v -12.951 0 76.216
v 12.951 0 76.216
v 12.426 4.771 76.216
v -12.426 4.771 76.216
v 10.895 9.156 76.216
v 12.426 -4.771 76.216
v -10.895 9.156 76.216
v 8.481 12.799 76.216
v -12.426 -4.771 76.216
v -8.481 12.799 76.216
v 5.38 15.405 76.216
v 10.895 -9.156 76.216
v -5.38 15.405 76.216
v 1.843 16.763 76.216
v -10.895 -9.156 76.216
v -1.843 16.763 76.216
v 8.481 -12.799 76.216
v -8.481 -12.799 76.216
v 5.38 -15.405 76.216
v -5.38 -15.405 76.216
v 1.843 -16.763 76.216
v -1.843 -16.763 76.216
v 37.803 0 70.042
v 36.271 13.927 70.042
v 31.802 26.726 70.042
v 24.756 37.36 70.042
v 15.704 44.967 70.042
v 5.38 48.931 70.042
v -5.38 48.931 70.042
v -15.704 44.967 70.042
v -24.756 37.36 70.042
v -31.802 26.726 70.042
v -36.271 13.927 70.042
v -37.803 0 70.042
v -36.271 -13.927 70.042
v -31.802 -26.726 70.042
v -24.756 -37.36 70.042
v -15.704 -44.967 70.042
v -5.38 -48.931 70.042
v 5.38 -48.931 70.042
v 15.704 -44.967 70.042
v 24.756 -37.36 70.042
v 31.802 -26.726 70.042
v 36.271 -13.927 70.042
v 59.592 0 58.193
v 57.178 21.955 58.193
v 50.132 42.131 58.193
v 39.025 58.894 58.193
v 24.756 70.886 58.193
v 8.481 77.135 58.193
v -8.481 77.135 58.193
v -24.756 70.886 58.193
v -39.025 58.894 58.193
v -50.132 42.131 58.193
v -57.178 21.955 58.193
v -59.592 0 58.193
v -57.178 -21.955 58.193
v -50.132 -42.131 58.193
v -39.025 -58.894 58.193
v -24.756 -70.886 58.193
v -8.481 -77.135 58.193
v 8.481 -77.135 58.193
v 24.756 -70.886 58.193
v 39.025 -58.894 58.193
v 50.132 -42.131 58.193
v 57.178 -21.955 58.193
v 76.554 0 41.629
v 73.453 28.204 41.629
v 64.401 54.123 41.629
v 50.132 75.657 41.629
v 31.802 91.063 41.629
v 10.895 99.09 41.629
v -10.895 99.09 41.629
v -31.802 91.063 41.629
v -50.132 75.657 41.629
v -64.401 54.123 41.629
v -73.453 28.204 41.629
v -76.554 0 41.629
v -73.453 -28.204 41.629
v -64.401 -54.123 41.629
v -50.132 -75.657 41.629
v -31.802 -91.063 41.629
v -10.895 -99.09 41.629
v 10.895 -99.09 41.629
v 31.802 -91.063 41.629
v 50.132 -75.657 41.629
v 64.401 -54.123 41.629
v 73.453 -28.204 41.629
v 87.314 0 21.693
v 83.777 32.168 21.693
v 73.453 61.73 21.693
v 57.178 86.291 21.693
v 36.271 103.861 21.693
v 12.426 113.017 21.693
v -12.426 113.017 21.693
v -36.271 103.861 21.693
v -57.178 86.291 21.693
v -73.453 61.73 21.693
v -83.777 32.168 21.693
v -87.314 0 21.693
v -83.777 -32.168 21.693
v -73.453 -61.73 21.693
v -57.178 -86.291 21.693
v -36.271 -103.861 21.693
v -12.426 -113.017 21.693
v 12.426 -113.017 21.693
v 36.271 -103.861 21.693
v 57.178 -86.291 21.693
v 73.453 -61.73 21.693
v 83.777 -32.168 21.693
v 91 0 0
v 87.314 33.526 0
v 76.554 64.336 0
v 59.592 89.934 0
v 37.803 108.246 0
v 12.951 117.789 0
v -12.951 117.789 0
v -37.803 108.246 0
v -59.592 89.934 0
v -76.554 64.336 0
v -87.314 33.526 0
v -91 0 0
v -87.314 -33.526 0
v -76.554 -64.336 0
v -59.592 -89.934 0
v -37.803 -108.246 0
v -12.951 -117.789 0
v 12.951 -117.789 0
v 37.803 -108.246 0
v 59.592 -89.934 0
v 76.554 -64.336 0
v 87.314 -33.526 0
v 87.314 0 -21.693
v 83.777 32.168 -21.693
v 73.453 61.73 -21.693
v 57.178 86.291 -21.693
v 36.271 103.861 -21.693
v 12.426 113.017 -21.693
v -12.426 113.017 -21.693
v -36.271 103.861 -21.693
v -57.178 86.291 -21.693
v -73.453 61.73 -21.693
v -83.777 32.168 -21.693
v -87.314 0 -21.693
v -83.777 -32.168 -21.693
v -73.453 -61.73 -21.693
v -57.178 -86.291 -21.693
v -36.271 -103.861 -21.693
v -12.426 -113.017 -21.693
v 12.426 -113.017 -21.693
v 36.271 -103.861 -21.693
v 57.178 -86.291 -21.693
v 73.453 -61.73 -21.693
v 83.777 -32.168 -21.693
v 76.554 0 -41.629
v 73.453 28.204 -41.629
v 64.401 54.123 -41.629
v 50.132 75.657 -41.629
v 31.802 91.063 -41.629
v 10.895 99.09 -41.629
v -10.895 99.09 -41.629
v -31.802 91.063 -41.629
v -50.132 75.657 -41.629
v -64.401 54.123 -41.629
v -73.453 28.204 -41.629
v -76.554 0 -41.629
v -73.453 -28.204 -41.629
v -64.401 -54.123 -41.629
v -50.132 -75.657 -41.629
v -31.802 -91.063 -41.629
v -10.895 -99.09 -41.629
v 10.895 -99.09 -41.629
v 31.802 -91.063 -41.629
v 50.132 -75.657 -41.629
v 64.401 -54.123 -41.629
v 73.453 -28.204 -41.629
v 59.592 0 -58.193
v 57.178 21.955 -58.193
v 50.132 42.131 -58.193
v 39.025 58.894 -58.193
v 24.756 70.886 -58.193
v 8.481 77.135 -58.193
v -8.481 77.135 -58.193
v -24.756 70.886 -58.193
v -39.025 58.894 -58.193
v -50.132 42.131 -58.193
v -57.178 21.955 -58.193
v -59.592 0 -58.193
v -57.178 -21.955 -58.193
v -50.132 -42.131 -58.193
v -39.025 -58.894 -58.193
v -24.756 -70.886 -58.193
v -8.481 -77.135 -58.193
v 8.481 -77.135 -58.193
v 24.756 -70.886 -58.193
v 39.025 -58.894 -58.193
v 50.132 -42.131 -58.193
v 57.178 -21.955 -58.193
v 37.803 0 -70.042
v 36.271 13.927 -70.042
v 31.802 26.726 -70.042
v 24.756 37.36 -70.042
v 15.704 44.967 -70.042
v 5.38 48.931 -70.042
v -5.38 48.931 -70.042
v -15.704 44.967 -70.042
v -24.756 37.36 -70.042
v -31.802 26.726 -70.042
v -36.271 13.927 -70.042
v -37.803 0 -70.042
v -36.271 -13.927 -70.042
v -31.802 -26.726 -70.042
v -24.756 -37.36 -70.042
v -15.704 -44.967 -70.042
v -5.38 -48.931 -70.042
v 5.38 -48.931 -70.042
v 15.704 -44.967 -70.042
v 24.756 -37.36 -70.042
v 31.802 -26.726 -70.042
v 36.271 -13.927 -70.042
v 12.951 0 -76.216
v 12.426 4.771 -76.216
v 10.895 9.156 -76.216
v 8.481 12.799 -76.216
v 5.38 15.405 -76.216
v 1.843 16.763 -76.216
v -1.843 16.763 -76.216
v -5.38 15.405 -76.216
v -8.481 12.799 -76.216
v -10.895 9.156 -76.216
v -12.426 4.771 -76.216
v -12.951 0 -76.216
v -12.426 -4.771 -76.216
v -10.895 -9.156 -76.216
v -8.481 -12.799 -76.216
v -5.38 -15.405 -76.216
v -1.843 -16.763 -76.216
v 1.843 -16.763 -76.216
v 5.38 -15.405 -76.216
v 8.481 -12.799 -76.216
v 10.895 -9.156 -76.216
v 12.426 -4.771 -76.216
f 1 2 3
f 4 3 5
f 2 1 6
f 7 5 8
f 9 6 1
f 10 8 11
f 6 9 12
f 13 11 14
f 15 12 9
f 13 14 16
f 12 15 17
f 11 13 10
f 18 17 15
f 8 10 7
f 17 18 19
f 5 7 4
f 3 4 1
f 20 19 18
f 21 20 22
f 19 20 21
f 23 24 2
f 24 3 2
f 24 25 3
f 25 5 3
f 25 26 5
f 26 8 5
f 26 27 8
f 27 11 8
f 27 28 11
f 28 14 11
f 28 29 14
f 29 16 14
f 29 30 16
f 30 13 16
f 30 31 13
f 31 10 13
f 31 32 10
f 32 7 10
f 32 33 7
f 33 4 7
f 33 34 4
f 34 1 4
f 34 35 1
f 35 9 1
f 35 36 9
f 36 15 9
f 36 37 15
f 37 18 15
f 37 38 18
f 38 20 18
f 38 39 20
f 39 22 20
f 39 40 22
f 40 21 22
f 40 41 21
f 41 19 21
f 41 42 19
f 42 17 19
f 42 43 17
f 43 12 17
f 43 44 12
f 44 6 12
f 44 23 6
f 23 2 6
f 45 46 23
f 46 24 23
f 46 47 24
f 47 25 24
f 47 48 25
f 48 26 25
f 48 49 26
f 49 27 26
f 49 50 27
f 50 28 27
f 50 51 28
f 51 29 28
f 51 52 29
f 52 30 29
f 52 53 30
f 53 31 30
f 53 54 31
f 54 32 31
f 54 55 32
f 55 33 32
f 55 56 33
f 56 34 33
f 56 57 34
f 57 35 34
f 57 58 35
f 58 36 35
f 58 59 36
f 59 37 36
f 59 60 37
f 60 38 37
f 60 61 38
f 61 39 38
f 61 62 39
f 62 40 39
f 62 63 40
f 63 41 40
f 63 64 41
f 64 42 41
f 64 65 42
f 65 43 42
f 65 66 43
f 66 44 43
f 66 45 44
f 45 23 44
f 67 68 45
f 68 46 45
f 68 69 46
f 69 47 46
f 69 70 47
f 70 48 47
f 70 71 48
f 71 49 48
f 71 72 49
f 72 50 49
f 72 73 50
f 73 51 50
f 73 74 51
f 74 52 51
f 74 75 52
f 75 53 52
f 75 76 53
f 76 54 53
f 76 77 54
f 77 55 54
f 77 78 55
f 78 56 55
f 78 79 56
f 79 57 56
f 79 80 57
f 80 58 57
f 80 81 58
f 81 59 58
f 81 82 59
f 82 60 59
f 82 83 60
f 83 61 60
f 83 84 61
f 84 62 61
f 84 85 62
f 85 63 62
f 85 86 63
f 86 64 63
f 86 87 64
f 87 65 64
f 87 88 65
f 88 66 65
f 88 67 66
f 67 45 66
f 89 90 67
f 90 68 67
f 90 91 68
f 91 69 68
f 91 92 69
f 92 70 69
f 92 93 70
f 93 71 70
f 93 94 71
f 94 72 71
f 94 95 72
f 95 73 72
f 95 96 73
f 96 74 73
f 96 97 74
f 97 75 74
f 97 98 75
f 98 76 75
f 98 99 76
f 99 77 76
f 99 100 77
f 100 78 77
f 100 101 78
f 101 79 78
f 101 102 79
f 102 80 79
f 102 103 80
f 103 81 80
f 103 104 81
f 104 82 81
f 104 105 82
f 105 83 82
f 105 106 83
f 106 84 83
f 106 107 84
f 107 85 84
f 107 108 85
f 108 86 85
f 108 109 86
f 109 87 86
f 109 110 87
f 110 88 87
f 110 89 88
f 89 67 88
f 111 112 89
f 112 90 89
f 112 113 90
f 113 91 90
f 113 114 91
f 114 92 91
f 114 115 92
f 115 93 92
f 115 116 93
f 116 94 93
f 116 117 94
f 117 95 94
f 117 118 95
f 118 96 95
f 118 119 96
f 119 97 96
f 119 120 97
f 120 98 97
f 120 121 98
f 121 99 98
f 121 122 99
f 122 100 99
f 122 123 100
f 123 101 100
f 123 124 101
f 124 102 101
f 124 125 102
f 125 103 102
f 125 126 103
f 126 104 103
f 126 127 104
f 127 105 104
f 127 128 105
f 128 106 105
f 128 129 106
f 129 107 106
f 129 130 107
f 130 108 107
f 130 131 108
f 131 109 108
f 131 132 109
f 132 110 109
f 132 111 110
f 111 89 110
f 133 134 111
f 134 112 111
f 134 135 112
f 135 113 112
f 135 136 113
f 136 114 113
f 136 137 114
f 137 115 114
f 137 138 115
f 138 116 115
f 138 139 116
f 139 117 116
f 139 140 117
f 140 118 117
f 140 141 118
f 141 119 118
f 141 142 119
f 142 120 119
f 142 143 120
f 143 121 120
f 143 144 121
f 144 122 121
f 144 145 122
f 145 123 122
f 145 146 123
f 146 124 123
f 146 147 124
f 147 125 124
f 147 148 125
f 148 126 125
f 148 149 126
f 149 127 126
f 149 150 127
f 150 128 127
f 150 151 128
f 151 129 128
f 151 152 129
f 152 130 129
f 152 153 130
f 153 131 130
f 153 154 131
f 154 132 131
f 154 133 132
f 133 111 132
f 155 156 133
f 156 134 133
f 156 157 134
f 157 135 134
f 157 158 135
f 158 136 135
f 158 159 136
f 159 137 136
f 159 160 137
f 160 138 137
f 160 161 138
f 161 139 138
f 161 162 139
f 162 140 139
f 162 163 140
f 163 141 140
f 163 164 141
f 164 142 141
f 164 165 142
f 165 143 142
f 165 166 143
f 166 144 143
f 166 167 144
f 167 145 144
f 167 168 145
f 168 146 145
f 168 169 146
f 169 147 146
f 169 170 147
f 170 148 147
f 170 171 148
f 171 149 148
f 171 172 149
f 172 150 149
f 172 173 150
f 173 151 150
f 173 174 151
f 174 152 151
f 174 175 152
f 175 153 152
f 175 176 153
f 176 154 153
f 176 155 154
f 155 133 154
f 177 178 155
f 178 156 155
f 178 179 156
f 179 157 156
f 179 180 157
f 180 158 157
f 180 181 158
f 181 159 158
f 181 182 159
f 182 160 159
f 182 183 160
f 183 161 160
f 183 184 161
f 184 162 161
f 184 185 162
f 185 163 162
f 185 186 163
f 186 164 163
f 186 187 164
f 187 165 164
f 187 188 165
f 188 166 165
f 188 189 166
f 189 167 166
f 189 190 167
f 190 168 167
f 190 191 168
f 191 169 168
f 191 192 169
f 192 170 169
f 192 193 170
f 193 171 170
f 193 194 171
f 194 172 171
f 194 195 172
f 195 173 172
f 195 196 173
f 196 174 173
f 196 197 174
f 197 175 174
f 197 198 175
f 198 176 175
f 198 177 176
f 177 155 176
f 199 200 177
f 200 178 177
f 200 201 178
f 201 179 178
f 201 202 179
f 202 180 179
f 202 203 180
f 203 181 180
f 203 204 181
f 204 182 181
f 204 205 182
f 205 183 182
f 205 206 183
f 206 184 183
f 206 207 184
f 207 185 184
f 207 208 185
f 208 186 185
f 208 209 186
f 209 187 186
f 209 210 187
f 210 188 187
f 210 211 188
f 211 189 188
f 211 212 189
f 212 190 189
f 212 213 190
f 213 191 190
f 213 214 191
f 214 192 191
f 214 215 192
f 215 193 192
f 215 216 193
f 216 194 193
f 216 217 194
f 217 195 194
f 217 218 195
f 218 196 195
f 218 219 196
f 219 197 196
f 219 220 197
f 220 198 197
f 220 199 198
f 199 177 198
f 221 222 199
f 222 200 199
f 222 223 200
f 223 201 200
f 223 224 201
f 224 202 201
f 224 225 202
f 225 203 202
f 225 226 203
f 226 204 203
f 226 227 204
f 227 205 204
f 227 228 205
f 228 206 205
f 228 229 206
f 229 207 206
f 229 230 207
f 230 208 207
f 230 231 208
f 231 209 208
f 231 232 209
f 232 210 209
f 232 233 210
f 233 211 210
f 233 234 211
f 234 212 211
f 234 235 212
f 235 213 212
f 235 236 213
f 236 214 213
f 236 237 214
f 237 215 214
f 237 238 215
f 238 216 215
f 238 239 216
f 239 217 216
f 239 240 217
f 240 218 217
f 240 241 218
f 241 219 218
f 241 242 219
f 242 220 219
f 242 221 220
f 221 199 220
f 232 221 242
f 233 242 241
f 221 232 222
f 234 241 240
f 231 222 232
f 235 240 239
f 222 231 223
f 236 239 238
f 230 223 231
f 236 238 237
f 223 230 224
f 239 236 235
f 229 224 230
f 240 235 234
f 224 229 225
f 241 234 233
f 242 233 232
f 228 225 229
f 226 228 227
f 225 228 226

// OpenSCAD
// Generated by SolidPython 1.0.1 on 2020-07-29 00:46:51


scale(v = [13, 17, 11]) {
	sphere(r = 7);
}
/***********************************************
*********      SolidPython code:      **********
************************************************
 
# import packages: SolidPython
from solid import *
from solid.utils import *
from itertools import chain, combinations, permutations


class Resize:

    def __init__(self, scad_file):
        self.scad_file = scad_file
        #self.scad_file = import_scad(scad_file)
        # cone/cylinder param:
        self.r1 = 0
        self.r2 = 0
        self.h = 0
        # rectangular prism param:
        self.w = 0
        self.l = 0
        # ellipse param:
        self.r = 0

    # import OpenScad code (file name corresponds to shape)


    # classify shape + parameters
    def assign(self, param1, param2, param3):
        if self.scad_file == 'cone.scad':
            self.r1 = param1
            self.r2 = param2
            self.h = param3
        elif self.scad_file == 'cylinder.scad':
            self.r1 = param1
            self.r2 = param2
            self.h = param3
        elif self.scad_file == 'rectangularPrism.scad':
            self.h = param1
            self.l = param2
            self.w = param3
        else:
            self.r = param1
            self.h = param2

    # resize parameters
    def iterate(self):
        x = range(3, 20, 2)
        i = 1
        if self.scad_file == 'cone.scad':
            tempList = list(permutations(x, 2))
            for temp in tempList:
                param1 = temp[0]
                param2 = temp[1]
                filepath = 'produced_scad_files/' + 'cone' + str(param1) + '_' + str(param2) + '_' + '.scad'
                scad_render_to_file(cylinder(h=param1, r1=param2, r2=0), filepath)

        elif self.scad_file == 'cylinder.scad':
            tempList = list(permutations(x, 3))
            for temp in tempList:
                param1 = temp[0]
                param2 = temp[1]
                filepath = 'produced_scad_files/' + 'cylinder' + str(param1) + '_' + str(param2) + '_' + '.scad'
                scad_render_to_file(cylinder(h=param1, r1=param2, r2=param2), filepath)

        elif self.scad_file == 'rectangularPrism.scad':
            tempList = list(permutations(x, 3))
            for temp in tempList:
                param1 = temp[0]
                param2 = temp[1]
                param3 = temp[2]
                filepath = 'produced_scad_files/' + 'rectangularPrism' + str(param1) + '_' + str(param2) + '_' + str(
                    param3) + '.scad'
                scad_render_to_file(cube(size=(param1, param2, param3)), filepath)

        elif self.scad_file == 'ellipse.scad':
            tempList = list(permutations(x, 4))
            for temp in tempList:
                param1 = temp[0]
                param2 = temp[1]
                param3 = temp[2]
                param4 = temp[3]
                filepath = 'produced_scad_files/' + 'ellipse' + str(param1) + '_' + str(param2) + '_' + str(param3) + '_' + str(param4) + '.scad'
                scad_render_to_file(scale([param1, param2, param3])(sphere(r=param4)), filepath)

    def render_to_scadfile(self):
        scad_render_to_file(scad, 'example.scad') 
 
************************************************/
